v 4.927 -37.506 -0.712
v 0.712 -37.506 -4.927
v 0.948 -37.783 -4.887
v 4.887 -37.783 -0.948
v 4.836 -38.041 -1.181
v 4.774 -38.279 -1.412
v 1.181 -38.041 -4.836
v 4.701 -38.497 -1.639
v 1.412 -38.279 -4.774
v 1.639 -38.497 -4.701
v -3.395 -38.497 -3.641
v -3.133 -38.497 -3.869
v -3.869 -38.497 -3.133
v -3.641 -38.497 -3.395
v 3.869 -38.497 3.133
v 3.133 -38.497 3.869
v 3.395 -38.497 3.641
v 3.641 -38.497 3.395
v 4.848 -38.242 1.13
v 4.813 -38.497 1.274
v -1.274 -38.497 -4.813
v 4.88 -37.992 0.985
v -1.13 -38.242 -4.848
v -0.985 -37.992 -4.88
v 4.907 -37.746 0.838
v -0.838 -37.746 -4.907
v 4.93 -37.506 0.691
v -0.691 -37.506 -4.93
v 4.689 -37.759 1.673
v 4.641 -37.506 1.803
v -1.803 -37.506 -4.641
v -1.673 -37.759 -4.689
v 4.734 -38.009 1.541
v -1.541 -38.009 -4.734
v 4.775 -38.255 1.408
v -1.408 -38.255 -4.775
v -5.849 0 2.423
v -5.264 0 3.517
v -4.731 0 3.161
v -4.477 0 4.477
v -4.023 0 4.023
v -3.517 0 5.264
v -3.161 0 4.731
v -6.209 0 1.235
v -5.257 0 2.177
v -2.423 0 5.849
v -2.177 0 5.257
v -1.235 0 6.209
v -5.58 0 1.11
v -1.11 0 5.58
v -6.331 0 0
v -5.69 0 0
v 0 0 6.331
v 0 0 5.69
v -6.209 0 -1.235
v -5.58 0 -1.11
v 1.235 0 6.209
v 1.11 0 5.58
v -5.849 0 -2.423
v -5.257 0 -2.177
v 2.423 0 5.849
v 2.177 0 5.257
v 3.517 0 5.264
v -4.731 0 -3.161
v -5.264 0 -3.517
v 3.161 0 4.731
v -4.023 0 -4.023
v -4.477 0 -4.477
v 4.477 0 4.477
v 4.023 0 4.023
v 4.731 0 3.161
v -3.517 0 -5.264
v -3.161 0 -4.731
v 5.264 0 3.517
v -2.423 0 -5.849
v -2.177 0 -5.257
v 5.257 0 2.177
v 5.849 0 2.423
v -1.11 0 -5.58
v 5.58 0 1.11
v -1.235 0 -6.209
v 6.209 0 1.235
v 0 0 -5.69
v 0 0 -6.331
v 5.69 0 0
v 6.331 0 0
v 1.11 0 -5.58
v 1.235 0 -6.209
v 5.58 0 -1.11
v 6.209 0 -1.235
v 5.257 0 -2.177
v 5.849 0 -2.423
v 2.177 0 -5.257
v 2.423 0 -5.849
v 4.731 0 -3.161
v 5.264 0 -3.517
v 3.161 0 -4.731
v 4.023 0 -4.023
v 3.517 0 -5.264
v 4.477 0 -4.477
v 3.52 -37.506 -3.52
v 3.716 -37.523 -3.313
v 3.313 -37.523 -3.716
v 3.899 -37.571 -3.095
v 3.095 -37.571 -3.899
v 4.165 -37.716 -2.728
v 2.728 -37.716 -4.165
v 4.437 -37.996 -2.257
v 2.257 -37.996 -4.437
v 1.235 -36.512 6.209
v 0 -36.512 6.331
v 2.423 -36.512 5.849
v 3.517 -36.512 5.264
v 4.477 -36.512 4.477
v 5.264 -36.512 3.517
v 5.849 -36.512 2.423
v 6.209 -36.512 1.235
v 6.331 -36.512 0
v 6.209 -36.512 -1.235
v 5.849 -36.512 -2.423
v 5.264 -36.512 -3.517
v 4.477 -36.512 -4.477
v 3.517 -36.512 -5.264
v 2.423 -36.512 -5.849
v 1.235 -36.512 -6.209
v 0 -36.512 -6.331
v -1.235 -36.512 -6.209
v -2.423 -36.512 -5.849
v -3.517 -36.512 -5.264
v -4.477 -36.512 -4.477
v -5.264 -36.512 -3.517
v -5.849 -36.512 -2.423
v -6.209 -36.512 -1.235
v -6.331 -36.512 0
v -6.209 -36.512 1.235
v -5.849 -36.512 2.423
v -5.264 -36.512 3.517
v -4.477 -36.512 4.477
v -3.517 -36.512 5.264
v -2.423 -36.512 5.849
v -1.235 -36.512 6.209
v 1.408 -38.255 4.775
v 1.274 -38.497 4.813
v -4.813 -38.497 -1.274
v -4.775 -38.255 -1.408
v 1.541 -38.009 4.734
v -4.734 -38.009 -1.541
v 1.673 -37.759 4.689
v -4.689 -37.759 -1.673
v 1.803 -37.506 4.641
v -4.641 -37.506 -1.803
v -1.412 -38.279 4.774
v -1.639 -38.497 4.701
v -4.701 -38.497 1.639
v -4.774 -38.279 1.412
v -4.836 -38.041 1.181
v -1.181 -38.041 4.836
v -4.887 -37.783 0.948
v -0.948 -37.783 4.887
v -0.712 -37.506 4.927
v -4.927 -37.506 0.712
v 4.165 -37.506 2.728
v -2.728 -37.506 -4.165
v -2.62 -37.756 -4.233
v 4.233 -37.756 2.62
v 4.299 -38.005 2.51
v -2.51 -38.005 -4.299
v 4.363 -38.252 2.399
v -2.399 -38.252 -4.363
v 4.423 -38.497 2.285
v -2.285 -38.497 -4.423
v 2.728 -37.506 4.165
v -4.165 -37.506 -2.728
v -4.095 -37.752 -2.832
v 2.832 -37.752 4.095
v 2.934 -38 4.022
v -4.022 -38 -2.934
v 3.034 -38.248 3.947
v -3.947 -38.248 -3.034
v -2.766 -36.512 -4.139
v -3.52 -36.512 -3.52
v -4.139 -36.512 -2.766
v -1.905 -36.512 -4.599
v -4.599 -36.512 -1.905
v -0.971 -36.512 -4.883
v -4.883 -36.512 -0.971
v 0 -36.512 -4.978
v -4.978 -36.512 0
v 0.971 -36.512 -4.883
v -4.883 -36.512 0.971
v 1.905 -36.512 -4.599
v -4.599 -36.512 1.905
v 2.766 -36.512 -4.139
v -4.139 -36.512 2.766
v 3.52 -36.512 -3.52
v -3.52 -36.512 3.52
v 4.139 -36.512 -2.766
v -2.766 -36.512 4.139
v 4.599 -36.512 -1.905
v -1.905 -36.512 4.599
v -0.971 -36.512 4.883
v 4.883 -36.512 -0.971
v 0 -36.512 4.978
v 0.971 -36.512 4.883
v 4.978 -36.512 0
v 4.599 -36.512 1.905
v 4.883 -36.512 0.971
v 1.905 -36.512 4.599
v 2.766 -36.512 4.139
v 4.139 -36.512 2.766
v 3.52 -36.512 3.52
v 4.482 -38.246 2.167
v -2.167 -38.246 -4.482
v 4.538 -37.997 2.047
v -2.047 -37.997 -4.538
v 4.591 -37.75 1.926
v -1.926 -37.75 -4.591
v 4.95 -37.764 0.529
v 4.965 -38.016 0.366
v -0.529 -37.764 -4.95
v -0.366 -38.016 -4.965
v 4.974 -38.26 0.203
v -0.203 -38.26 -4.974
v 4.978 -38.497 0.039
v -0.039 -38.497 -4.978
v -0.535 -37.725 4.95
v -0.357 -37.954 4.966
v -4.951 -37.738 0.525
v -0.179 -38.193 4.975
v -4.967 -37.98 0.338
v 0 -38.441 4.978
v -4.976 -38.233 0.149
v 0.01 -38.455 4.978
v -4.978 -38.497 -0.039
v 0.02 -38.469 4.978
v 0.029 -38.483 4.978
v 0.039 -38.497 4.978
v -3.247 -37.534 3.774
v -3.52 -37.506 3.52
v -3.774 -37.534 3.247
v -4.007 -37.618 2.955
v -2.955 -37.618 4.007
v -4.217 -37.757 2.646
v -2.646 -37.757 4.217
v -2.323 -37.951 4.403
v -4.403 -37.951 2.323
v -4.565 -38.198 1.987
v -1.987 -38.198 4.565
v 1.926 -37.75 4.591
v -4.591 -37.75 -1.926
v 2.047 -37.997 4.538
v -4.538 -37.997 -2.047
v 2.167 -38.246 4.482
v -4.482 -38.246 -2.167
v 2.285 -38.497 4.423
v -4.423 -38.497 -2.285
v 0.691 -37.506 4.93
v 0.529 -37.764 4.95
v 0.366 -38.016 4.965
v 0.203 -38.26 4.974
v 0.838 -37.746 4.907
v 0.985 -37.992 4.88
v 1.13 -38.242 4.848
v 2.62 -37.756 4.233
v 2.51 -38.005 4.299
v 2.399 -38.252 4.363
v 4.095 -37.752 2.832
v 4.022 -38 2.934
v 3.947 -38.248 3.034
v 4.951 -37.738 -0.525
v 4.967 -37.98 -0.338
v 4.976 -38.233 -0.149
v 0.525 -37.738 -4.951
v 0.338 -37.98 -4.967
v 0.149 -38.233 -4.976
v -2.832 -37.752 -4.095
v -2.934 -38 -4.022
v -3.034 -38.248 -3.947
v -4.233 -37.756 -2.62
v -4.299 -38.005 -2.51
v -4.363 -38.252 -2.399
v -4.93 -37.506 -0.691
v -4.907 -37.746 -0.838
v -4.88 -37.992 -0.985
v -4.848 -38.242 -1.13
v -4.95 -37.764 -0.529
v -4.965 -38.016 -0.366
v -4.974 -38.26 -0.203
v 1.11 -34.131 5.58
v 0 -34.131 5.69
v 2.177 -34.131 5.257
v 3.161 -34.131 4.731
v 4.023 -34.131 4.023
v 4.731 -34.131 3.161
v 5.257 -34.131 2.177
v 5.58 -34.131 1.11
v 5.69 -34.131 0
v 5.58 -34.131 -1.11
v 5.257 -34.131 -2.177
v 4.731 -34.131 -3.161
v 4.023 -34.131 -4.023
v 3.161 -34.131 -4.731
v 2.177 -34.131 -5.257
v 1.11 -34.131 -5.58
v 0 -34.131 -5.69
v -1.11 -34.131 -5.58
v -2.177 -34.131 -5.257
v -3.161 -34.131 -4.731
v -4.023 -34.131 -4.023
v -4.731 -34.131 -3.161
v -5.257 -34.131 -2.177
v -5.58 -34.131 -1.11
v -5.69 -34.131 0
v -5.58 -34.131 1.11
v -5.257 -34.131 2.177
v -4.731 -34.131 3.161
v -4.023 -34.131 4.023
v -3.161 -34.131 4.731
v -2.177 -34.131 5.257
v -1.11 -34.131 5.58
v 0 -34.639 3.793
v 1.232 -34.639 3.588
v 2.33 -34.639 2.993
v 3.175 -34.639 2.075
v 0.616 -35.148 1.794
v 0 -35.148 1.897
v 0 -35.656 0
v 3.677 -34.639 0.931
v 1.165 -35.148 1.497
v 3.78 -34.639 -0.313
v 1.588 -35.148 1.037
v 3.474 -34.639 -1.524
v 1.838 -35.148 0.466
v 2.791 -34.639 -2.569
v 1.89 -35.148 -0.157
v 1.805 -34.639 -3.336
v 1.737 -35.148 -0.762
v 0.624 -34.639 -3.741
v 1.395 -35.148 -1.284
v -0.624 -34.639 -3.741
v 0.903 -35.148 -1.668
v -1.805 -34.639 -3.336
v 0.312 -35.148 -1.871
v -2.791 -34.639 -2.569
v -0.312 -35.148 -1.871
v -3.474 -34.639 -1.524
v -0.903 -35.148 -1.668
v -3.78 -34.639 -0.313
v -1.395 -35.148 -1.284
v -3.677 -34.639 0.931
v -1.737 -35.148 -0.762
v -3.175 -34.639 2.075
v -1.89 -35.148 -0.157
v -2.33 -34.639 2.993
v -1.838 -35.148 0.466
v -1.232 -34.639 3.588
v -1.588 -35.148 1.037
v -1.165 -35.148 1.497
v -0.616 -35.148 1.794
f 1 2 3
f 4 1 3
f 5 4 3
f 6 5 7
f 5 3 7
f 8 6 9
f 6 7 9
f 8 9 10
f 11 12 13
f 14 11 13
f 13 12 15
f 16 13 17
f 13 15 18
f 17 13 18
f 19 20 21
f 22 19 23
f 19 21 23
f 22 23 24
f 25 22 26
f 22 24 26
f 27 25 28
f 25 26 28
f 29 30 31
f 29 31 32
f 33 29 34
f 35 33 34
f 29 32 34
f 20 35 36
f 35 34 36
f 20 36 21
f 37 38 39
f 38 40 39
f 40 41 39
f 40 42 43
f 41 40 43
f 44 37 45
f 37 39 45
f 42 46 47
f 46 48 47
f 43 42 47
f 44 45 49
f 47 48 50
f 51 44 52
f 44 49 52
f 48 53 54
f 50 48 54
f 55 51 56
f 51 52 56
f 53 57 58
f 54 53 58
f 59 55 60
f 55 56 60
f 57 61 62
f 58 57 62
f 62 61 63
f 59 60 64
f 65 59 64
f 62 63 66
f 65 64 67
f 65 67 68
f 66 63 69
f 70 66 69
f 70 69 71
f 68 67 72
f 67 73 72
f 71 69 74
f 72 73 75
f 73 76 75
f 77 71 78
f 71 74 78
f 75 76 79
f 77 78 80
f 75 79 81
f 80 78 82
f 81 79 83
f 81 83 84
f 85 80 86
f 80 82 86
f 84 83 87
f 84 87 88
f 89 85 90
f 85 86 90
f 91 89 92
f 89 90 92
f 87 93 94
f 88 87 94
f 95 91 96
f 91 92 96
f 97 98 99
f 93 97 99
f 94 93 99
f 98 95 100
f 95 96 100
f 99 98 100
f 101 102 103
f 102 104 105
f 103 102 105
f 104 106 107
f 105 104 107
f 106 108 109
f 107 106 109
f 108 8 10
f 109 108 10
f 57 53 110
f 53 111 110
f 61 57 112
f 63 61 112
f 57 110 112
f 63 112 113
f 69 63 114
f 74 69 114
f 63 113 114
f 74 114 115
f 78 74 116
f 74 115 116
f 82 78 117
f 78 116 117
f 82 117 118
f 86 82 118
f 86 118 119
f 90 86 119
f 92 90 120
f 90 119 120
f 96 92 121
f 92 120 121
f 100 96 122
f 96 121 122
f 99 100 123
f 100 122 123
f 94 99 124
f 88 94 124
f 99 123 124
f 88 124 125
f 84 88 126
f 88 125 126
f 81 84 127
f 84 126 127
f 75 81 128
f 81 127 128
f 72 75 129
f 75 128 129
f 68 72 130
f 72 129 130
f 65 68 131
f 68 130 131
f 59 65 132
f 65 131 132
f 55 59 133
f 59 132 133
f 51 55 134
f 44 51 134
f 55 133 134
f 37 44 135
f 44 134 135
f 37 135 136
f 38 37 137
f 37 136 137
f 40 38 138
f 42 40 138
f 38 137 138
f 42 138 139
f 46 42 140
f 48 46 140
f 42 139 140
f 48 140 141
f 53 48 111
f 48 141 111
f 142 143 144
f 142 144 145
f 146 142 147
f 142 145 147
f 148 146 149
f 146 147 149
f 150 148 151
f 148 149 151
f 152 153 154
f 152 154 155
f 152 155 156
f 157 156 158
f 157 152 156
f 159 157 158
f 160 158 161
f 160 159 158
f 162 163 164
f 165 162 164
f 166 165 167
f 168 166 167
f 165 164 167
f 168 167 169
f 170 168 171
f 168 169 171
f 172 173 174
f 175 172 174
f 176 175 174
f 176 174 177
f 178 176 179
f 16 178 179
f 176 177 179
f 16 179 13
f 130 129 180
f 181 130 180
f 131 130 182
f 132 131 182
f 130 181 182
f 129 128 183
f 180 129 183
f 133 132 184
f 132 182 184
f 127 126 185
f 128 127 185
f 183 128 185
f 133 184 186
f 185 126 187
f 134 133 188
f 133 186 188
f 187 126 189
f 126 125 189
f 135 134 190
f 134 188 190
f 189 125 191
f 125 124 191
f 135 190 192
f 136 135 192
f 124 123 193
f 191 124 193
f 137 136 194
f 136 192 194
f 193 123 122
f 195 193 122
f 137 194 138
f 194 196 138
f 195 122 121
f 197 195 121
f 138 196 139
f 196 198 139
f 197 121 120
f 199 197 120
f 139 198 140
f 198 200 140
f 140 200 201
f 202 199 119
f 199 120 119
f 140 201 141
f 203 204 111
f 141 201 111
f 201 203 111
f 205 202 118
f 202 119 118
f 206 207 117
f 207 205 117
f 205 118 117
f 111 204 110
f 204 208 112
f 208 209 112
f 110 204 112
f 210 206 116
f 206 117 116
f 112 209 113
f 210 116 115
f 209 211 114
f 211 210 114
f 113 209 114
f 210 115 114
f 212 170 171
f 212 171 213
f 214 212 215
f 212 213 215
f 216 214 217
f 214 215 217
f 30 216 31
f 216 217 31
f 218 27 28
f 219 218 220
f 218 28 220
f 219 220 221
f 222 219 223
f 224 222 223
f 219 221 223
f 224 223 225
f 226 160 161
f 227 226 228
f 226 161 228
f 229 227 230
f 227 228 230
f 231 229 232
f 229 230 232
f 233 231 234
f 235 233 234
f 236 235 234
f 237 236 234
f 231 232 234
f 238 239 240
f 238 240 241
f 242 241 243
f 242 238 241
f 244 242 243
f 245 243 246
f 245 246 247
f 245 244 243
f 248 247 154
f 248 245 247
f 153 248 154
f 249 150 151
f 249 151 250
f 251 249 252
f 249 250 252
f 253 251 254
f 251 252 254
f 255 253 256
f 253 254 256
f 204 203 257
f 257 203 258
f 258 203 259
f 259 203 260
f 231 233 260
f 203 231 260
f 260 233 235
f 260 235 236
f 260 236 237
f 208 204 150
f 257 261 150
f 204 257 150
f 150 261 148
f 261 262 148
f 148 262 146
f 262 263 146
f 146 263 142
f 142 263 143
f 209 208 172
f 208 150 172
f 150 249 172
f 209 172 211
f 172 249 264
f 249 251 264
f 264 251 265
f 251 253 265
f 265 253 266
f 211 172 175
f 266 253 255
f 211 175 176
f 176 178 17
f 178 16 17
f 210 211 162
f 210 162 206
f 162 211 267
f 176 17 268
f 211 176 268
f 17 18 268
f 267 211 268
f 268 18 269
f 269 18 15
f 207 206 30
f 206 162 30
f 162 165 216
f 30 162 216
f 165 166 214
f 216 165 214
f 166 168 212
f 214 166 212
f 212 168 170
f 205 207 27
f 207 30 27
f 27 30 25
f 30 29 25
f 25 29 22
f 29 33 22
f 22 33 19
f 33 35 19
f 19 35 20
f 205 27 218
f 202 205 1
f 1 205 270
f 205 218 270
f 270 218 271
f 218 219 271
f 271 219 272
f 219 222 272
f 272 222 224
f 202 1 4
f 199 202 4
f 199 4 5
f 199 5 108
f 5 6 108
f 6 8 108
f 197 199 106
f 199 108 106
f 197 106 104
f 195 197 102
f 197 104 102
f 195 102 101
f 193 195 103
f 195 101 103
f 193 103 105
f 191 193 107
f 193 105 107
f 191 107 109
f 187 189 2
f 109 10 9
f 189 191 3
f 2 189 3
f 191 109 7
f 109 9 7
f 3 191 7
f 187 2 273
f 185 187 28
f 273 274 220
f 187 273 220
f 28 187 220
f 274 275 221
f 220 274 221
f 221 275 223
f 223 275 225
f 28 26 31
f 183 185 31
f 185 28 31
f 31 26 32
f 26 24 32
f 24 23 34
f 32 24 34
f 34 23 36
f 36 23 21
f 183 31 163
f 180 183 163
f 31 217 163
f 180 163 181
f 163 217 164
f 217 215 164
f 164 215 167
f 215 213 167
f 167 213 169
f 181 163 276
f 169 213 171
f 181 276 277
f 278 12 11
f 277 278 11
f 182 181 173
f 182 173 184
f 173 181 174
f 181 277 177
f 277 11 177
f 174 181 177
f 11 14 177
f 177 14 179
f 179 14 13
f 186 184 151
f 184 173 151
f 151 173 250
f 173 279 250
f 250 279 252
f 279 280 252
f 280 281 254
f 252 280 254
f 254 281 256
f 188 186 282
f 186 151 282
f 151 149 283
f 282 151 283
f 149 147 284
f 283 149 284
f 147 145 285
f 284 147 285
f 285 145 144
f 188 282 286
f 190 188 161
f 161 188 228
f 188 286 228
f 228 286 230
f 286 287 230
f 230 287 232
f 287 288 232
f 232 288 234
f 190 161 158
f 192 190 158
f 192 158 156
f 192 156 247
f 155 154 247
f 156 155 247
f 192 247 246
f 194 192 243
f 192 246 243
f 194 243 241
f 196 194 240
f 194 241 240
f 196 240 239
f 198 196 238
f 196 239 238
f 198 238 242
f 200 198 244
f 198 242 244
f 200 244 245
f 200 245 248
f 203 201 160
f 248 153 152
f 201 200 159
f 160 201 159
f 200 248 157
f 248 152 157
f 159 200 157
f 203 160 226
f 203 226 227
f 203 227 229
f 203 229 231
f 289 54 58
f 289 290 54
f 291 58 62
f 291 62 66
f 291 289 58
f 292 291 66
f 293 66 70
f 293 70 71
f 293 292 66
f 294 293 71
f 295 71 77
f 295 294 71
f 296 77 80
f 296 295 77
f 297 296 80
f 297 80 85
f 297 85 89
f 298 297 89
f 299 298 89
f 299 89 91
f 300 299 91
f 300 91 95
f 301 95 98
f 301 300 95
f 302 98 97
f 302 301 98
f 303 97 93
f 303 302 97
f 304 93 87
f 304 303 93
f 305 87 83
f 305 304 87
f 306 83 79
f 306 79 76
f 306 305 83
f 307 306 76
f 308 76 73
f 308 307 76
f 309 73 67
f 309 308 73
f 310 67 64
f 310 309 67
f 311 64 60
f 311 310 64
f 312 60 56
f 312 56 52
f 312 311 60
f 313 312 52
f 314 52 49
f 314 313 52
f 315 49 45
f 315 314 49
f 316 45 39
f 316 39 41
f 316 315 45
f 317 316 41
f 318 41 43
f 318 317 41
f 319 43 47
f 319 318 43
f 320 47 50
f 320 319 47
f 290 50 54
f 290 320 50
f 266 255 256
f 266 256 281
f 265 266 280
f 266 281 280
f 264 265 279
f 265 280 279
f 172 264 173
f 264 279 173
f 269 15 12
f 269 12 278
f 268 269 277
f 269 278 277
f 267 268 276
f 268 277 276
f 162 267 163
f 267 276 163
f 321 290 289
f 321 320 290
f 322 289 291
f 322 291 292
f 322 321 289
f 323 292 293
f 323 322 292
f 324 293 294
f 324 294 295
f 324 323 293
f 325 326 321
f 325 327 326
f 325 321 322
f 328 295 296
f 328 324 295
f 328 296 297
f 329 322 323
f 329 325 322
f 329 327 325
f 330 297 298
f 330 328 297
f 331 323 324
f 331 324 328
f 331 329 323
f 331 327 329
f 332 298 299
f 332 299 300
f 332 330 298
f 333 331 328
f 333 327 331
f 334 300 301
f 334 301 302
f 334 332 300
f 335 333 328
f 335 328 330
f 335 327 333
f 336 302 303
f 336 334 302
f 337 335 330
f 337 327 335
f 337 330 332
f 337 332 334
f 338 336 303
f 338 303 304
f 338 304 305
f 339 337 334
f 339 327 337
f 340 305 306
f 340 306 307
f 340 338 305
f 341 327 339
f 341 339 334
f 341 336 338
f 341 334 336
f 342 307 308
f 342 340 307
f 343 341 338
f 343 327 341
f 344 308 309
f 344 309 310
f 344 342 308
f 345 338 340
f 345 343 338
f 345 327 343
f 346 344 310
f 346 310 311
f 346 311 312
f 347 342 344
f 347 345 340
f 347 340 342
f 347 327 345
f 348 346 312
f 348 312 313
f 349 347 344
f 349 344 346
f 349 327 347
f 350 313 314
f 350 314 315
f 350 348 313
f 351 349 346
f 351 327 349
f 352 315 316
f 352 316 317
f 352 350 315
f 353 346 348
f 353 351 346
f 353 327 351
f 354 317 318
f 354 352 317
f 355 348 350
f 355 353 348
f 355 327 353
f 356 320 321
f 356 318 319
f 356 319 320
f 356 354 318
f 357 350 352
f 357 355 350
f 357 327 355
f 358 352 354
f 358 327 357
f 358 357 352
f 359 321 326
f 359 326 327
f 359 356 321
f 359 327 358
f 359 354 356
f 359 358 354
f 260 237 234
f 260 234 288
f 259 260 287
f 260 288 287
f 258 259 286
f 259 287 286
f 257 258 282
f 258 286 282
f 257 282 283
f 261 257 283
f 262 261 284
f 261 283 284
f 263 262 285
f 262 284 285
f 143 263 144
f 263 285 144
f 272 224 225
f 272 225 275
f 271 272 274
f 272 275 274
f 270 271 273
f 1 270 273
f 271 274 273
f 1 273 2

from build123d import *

# Parameters (mm, degrees)
F7_DEPTH      = 8.9543153527
F7_DEPTH_BACK = 25.4


with BuildPart() as f1:
    # F0 (on Right) → F1 (revolve)
    with BuildSketch(Plane.YZ):
        Polygon((-38.496875, 0), (0, 0), (0, 6.33095), (-36.5125, 6.33095), (-36.5125, 4.9784), (-38.496875, 4.9784), align=None)
    revolve(axis=Axis((0, 7.9408854224, 0), (0, 1, 0)))

    # F2 (on Right) → F3 (revolve, cut)
    with BuildSketch(Plane.YZ):
        Polygon((0, 5.6896), (-34.13125, 5.6896), (-35.6557737253, 0), (0, 0), align=None)
    revolve(axis=Axis((0, 5.2174264412, 0), (0, 1, 0)), mode=Mode.SUBTRACT)

    # F6 (on line) → F7 (cut, two sides)
    with BuildSketch(Plane(origin=(0, 0, 0), x_dir=(0, -1, 0), z_dir=(-0.7071067812, 0, -0.7071067812))) as f7_sk:
        Polygon((37.506275, 4.9784), (38.496875, 4.4831), (37.506275, 3.9878), (38.496875, 3.4925), (37.506275, 2.9972), (38.496875, 2.5019), (37.506275, 2.0066), (38.496875, 1.5113), (37.506275, 1.016), (38.496875, 0.5207), (38.496875, -0.5207), (37.506275, -1.016), (38.496875, -1.5113), (37.506275, -2.0066), (38.496875, -2.5019), (37.506275, -2.9972), (38.496875, -3.4925), (37.506275, -3.9878), (38.496875, -4.4831), (37.506275, -4.9784), (37.506275, -6.6715925932), (39.5995303988, -6.6715925932), (39.5995303988, 6.7129228264), (37.506275, 6.7129228264), align=None)
    extrude(amount=-F7_DEPTH, mode=Mode.SUBTRACT)
    extrude(f7_sk.sketch, amount=F7_DEPTH_BACK, mode=Mode.SUBTRACT)


solid = f1.part
